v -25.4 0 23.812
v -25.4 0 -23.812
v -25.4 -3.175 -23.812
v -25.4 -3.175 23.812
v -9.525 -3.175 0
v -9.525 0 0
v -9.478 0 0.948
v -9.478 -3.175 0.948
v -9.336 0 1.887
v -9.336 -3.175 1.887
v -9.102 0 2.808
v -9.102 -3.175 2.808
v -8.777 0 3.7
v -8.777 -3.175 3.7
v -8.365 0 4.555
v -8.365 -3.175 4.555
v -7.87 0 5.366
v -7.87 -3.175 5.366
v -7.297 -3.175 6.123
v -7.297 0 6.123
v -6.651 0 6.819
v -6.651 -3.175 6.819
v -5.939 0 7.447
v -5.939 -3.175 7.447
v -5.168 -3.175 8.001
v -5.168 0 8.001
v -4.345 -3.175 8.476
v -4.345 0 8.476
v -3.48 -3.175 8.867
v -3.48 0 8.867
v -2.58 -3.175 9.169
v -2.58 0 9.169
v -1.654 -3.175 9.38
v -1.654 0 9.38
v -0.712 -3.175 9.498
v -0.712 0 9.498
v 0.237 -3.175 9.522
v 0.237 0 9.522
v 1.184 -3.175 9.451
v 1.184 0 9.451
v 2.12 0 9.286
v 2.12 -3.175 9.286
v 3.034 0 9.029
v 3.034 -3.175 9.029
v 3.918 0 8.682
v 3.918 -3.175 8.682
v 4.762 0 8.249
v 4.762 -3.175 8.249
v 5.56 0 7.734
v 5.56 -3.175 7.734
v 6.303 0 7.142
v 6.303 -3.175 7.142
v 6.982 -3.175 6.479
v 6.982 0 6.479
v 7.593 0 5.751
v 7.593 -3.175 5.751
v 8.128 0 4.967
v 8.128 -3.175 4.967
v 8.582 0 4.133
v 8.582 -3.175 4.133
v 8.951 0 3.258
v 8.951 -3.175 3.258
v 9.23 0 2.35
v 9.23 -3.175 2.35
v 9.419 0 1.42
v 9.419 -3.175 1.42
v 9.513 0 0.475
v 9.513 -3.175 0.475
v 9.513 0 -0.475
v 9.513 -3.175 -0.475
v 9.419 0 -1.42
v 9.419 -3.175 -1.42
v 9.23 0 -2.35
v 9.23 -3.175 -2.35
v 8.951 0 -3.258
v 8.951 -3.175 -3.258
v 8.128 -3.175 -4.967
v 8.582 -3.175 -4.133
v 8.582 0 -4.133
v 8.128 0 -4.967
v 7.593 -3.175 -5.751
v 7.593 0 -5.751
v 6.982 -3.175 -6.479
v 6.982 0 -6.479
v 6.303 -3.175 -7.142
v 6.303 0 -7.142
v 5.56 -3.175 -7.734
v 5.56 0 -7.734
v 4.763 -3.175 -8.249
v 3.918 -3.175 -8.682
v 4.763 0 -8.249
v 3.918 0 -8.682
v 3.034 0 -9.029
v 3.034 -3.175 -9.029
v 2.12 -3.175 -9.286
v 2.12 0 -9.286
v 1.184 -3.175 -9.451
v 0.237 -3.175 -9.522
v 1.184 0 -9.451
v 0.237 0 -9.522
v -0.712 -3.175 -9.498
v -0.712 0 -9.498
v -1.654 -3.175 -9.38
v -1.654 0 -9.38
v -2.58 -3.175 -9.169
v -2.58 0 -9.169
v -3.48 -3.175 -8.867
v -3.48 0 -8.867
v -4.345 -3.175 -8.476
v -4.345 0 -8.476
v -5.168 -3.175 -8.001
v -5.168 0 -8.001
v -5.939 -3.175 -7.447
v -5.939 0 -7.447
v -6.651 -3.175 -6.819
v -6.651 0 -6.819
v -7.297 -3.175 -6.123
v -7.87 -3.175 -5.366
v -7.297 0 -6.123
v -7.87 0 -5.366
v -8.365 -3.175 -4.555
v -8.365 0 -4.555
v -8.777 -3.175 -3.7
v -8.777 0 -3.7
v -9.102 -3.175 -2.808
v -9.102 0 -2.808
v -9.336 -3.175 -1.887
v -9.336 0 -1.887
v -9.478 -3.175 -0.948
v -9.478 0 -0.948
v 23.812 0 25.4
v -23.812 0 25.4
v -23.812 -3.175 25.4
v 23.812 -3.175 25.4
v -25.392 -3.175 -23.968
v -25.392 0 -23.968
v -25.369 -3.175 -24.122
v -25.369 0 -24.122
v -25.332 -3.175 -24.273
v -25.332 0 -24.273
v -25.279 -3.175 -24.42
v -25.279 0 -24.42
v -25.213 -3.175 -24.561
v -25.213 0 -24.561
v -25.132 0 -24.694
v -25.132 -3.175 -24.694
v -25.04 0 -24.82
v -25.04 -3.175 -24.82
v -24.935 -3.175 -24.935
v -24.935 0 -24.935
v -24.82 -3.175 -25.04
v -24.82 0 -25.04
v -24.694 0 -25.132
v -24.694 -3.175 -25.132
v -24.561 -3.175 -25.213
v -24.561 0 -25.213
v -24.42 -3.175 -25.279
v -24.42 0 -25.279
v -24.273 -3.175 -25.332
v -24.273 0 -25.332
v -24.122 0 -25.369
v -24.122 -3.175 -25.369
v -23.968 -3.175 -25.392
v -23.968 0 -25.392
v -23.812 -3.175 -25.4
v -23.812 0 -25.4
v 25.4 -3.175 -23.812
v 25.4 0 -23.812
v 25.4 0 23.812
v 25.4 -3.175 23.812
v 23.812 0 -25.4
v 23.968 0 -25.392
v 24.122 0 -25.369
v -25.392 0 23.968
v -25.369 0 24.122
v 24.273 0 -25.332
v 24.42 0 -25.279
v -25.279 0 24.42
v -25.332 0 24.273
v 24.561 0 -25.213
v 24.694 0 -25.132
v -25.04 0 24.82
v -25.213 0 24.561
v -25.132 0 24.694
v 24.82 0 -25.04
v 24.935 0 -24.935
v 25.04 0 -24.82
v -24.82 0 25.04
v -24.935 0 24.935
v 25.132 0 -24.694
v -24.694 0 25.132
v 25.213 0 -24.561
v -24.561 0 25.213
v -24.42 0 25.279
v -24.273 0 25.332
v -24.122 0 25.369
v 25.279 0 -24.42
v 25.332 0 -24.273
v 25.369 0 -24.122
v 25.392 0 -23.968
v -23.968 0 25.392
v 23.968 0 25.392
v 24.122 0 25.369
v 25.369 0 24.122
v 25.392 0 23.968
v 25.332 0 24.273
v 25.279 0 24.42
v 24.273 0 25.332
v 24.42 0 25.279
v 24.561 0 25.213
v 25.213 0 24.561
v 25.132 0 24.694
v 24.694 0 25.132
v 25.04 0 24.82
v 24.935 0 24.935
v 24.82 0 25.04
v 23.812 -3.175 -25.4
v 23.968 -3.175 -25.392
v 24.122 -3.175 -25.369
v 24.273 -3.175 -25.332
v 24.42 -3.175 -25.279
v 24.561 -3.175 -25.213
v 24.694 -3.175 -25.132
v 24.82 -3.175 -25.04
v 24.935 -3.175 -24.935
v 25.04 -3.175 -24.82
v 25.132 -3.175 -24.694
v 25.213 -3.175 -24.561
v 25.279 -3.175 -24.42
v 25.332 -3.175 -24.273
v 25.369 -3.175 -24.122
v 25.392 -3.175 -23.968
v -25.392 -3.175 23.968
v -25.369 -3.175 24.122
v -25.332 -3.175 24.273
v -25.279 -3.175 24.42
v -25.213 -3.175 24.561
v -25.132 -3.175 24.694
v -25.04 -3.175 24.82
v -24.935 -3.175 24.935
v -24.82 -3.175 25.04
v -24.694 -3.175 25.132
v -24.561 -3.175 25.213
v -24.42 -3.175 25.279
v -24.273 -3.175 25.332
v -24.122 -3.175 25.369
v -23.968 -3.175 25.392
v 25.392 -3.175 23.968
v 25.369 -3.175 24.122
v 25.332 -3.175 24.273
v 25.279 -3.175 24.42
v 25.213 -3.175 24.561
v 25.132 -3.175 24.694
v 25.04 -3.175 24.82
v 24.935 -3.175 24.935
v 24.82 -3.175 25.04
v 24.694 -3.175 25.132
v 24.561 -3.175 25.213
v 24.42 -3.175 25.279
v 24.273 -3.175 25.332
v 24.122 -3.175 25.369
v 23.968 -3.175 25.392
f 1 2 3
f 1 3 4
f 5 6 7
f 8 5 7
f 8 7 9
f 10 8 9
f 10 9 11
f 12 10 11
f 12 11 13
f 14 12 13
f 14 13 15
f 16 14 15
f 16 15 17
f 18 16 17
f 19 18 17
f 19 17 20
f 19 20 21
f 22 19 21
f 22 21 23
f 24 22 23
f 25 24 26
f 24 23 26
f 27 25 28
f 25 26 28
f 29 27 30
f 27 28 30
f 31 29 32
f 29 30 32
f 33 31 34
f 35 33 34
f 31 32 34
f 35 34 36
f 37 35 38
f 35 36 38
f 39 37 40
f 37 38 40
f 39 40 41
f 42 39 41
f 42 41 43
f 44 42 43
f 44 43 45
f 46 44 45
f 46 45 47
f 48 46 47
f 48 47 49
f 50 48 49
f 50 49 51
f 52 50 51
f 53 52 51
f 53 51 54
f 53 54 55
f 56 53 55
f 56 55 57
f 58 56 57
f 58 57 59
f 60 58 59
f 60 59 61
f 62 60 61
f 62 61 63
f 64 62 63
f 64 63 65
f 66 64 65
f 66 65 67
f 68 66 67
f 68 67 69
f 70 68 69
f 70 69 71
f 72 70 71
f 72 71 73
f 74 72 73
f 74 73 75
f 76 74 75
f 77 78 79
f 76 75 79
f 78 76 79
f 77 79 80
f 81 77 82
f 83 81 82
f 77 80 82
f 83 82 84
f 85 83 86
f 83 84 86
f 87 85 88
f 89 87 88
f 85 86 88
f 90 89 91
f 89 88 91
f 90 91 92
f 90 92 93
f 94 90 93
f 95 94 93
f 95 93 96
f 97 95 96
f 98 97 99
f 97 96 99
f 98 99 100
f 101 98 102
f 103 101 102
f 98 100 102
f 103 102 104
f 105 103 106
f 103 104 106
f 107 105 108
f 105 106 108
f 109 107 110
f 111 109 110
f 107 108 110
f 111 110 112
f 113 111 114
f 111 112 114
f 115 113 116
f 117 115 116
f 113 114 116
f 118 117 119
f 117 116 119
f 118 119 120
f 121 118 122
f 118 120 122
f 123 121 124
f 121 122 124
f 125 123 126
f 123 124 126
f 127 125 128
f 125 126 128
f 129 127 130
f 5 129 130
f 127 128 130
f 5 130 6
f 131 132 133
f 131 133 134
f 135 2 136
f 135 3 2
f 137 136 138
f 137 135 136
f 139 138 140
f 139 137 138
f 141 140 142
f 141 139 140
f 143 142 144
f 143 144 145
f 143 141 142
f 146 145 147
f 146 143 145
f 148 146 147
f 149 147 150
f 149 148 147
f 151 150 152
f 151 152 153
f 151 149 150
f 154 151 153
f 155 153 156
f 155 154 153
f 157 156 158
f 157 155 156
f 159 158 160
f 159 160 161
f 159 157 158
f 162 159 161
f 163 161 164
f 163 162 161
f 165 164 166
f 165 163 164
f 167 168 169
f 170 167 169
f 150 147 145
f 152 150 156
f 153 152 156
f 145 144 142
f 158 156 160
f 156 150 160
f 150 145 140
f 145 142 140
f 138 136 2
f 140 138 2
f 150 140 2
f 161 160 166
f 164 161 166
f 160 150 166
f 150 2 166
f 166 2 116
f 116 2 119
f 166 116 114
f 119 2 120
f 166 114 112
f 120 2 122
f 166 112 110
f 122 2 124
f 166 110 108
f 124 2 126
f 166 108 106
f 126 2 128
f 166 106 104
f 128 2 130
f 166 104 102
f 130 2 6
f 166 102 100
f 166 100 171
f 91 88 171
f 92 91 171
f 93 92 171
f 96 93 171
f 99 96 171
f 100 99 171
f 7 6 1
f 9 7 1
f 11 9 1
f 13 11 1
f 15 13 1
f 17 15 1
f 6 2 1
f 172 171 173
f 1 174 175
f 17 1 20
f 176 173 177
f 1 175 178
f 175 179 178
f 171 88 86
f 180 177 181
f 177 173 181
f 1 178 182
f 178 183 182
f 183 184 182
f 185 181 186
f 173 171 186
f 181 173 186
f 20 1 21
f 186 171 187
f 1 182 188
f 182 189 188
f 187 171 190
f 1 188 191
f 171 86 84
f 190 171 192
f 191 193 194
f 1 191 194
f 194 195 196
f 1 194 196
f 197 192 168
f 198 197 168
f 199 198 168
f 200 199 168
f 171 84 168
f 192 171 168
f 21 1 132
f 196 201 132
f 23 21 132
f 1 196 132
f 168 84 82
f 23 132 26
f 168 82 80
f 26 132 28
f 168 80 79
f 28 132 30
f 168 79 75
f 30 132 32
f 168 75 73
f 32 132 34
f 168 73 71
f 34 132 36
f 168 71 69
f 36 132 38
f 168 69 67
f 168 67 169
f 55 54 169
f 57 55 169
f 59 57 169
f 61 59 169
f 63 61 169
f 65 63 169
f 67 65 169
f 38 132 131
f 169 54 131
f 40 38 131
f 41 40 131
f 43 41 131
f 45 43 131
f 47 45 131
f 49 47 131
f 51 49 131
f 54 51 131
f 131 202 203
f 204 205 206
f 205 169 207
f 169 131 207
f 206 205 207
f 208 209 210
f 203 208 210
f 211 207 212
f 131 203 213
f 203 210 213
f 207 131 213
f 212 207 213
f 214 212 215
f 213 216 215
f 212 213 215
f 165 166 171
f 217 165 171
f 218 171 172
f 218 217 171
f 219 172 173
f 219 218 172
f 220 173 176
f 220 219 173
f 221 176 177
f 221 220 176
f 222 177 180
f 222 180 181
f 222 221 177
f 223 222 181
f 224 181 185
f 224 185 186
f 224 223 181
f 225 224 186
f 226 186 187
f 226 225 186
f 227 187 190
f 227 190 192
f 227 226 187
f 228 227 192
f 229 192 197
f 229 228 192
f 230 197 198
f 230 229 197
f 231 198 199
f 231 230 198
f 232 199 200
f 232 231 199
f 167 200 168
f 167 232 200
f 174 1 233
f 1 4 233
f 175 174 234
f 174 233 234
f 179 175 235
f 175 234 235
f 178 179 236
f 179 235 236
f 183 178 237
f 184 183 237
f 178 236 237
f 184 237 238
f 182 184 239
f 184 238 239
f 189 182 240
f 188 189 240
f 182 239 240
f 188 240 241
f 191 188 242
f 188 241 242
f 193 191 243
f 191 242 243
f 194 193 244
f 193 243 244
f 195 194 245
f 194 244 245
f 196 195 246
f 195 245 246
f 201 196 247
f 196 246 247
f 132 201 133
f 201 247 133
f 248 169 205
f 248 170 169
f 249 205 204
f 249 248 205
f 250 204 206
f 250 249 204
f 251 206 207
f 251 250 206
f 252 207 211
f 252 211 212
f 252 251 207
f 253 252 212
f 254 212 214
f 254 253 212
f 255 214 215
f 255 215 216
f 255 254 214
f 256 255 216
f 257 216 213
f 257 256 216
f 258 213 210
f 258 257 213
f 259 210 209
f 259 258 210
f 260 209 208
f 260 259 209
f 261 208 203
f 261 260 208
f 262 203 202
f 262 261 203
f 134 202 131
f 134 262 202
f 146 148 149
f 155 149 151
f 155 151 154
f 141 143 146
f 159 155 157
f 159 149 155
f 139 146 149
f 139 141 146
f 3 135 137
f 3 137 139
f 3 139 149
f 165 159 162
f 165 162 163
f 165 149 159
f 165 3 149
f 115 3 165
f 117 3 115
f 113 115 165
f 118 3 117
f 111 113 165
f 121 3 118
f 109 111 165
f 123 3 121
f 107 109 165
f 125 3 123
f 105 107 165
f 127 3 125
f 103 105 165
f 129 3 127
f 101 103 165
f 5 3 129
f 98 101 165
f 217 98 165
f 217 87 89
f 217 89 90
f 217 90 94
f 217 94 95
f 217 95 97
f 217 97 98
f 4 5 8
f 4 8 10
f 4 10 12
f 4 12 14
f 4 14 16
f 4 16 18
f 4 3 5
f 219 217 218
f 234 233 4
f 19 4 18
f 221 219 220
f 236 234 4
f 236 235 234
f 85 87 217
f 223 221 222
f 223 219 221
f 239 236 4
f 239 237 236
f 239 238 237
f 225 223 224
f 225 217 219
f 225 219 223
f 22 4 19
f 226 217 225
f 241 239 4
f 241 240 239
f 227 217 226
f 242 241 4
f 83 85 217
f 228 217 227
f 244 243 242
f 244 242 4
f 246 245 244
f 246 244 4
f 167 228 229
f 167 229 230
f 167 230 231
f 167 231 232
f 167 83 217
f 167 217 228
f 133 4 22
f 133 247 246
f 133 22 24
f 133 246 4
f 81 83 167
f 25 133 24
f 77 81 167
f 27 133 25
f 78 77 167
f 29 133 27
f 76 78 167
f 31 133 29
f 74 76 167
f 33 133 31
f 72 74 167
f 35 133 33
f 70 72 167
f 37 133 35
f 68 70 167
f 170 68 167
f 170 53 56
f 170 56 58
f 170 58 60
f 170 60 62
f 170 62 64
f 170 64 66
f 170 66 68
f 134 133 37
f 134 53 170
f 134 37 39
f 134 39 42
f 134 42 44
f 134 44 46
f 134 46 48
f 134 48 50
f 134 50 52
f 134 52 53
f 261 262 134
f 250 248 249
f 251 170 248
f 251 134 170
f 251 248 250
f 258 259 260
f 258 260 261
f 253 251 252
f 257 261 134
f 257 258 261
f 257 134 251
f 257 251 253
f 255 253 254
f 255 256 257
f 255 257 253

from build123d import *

# Parameters (mm, degrees)
F0_W     = 50.8
F0_H     = 50.8
F1_DEPTH = 3.175
F2_R     = 1.5875
F3_R     = 9.525
F4_DEPTH = 3.176


with BuildPart() as f1:
    # F0 (on Front) → F1 (new body)
    with BuildSketch(Plane.XZ):
        Rectangle(F0_W, F0_H)
    extrude(amount=F1_DEPTH)

    # F2
    f2_edges = [f1.edges().sort_by_distance(p)[0] for p in [
        (25.4, -1.5875, 25.4),
        (-25.4, -1.5875, 25.4),
        (-25.4, -1.5875, -25.4),
        (25.4, -1.5875, -25.4),
    ]]
    fillet(f2_edges, radius=F2_R)

    # F3 (on face) → F4 (cut, through all)
    with BuildSketch(Plane(origin=(0, 0, 0), x_dir=(-1, 0, 0), z_dir=(0, 1, 0))):
        Circle(F3_R)
    extrude(amount=-F4_DEPTH, mode=Mode.SUBTRACT)


solid = f1.part
